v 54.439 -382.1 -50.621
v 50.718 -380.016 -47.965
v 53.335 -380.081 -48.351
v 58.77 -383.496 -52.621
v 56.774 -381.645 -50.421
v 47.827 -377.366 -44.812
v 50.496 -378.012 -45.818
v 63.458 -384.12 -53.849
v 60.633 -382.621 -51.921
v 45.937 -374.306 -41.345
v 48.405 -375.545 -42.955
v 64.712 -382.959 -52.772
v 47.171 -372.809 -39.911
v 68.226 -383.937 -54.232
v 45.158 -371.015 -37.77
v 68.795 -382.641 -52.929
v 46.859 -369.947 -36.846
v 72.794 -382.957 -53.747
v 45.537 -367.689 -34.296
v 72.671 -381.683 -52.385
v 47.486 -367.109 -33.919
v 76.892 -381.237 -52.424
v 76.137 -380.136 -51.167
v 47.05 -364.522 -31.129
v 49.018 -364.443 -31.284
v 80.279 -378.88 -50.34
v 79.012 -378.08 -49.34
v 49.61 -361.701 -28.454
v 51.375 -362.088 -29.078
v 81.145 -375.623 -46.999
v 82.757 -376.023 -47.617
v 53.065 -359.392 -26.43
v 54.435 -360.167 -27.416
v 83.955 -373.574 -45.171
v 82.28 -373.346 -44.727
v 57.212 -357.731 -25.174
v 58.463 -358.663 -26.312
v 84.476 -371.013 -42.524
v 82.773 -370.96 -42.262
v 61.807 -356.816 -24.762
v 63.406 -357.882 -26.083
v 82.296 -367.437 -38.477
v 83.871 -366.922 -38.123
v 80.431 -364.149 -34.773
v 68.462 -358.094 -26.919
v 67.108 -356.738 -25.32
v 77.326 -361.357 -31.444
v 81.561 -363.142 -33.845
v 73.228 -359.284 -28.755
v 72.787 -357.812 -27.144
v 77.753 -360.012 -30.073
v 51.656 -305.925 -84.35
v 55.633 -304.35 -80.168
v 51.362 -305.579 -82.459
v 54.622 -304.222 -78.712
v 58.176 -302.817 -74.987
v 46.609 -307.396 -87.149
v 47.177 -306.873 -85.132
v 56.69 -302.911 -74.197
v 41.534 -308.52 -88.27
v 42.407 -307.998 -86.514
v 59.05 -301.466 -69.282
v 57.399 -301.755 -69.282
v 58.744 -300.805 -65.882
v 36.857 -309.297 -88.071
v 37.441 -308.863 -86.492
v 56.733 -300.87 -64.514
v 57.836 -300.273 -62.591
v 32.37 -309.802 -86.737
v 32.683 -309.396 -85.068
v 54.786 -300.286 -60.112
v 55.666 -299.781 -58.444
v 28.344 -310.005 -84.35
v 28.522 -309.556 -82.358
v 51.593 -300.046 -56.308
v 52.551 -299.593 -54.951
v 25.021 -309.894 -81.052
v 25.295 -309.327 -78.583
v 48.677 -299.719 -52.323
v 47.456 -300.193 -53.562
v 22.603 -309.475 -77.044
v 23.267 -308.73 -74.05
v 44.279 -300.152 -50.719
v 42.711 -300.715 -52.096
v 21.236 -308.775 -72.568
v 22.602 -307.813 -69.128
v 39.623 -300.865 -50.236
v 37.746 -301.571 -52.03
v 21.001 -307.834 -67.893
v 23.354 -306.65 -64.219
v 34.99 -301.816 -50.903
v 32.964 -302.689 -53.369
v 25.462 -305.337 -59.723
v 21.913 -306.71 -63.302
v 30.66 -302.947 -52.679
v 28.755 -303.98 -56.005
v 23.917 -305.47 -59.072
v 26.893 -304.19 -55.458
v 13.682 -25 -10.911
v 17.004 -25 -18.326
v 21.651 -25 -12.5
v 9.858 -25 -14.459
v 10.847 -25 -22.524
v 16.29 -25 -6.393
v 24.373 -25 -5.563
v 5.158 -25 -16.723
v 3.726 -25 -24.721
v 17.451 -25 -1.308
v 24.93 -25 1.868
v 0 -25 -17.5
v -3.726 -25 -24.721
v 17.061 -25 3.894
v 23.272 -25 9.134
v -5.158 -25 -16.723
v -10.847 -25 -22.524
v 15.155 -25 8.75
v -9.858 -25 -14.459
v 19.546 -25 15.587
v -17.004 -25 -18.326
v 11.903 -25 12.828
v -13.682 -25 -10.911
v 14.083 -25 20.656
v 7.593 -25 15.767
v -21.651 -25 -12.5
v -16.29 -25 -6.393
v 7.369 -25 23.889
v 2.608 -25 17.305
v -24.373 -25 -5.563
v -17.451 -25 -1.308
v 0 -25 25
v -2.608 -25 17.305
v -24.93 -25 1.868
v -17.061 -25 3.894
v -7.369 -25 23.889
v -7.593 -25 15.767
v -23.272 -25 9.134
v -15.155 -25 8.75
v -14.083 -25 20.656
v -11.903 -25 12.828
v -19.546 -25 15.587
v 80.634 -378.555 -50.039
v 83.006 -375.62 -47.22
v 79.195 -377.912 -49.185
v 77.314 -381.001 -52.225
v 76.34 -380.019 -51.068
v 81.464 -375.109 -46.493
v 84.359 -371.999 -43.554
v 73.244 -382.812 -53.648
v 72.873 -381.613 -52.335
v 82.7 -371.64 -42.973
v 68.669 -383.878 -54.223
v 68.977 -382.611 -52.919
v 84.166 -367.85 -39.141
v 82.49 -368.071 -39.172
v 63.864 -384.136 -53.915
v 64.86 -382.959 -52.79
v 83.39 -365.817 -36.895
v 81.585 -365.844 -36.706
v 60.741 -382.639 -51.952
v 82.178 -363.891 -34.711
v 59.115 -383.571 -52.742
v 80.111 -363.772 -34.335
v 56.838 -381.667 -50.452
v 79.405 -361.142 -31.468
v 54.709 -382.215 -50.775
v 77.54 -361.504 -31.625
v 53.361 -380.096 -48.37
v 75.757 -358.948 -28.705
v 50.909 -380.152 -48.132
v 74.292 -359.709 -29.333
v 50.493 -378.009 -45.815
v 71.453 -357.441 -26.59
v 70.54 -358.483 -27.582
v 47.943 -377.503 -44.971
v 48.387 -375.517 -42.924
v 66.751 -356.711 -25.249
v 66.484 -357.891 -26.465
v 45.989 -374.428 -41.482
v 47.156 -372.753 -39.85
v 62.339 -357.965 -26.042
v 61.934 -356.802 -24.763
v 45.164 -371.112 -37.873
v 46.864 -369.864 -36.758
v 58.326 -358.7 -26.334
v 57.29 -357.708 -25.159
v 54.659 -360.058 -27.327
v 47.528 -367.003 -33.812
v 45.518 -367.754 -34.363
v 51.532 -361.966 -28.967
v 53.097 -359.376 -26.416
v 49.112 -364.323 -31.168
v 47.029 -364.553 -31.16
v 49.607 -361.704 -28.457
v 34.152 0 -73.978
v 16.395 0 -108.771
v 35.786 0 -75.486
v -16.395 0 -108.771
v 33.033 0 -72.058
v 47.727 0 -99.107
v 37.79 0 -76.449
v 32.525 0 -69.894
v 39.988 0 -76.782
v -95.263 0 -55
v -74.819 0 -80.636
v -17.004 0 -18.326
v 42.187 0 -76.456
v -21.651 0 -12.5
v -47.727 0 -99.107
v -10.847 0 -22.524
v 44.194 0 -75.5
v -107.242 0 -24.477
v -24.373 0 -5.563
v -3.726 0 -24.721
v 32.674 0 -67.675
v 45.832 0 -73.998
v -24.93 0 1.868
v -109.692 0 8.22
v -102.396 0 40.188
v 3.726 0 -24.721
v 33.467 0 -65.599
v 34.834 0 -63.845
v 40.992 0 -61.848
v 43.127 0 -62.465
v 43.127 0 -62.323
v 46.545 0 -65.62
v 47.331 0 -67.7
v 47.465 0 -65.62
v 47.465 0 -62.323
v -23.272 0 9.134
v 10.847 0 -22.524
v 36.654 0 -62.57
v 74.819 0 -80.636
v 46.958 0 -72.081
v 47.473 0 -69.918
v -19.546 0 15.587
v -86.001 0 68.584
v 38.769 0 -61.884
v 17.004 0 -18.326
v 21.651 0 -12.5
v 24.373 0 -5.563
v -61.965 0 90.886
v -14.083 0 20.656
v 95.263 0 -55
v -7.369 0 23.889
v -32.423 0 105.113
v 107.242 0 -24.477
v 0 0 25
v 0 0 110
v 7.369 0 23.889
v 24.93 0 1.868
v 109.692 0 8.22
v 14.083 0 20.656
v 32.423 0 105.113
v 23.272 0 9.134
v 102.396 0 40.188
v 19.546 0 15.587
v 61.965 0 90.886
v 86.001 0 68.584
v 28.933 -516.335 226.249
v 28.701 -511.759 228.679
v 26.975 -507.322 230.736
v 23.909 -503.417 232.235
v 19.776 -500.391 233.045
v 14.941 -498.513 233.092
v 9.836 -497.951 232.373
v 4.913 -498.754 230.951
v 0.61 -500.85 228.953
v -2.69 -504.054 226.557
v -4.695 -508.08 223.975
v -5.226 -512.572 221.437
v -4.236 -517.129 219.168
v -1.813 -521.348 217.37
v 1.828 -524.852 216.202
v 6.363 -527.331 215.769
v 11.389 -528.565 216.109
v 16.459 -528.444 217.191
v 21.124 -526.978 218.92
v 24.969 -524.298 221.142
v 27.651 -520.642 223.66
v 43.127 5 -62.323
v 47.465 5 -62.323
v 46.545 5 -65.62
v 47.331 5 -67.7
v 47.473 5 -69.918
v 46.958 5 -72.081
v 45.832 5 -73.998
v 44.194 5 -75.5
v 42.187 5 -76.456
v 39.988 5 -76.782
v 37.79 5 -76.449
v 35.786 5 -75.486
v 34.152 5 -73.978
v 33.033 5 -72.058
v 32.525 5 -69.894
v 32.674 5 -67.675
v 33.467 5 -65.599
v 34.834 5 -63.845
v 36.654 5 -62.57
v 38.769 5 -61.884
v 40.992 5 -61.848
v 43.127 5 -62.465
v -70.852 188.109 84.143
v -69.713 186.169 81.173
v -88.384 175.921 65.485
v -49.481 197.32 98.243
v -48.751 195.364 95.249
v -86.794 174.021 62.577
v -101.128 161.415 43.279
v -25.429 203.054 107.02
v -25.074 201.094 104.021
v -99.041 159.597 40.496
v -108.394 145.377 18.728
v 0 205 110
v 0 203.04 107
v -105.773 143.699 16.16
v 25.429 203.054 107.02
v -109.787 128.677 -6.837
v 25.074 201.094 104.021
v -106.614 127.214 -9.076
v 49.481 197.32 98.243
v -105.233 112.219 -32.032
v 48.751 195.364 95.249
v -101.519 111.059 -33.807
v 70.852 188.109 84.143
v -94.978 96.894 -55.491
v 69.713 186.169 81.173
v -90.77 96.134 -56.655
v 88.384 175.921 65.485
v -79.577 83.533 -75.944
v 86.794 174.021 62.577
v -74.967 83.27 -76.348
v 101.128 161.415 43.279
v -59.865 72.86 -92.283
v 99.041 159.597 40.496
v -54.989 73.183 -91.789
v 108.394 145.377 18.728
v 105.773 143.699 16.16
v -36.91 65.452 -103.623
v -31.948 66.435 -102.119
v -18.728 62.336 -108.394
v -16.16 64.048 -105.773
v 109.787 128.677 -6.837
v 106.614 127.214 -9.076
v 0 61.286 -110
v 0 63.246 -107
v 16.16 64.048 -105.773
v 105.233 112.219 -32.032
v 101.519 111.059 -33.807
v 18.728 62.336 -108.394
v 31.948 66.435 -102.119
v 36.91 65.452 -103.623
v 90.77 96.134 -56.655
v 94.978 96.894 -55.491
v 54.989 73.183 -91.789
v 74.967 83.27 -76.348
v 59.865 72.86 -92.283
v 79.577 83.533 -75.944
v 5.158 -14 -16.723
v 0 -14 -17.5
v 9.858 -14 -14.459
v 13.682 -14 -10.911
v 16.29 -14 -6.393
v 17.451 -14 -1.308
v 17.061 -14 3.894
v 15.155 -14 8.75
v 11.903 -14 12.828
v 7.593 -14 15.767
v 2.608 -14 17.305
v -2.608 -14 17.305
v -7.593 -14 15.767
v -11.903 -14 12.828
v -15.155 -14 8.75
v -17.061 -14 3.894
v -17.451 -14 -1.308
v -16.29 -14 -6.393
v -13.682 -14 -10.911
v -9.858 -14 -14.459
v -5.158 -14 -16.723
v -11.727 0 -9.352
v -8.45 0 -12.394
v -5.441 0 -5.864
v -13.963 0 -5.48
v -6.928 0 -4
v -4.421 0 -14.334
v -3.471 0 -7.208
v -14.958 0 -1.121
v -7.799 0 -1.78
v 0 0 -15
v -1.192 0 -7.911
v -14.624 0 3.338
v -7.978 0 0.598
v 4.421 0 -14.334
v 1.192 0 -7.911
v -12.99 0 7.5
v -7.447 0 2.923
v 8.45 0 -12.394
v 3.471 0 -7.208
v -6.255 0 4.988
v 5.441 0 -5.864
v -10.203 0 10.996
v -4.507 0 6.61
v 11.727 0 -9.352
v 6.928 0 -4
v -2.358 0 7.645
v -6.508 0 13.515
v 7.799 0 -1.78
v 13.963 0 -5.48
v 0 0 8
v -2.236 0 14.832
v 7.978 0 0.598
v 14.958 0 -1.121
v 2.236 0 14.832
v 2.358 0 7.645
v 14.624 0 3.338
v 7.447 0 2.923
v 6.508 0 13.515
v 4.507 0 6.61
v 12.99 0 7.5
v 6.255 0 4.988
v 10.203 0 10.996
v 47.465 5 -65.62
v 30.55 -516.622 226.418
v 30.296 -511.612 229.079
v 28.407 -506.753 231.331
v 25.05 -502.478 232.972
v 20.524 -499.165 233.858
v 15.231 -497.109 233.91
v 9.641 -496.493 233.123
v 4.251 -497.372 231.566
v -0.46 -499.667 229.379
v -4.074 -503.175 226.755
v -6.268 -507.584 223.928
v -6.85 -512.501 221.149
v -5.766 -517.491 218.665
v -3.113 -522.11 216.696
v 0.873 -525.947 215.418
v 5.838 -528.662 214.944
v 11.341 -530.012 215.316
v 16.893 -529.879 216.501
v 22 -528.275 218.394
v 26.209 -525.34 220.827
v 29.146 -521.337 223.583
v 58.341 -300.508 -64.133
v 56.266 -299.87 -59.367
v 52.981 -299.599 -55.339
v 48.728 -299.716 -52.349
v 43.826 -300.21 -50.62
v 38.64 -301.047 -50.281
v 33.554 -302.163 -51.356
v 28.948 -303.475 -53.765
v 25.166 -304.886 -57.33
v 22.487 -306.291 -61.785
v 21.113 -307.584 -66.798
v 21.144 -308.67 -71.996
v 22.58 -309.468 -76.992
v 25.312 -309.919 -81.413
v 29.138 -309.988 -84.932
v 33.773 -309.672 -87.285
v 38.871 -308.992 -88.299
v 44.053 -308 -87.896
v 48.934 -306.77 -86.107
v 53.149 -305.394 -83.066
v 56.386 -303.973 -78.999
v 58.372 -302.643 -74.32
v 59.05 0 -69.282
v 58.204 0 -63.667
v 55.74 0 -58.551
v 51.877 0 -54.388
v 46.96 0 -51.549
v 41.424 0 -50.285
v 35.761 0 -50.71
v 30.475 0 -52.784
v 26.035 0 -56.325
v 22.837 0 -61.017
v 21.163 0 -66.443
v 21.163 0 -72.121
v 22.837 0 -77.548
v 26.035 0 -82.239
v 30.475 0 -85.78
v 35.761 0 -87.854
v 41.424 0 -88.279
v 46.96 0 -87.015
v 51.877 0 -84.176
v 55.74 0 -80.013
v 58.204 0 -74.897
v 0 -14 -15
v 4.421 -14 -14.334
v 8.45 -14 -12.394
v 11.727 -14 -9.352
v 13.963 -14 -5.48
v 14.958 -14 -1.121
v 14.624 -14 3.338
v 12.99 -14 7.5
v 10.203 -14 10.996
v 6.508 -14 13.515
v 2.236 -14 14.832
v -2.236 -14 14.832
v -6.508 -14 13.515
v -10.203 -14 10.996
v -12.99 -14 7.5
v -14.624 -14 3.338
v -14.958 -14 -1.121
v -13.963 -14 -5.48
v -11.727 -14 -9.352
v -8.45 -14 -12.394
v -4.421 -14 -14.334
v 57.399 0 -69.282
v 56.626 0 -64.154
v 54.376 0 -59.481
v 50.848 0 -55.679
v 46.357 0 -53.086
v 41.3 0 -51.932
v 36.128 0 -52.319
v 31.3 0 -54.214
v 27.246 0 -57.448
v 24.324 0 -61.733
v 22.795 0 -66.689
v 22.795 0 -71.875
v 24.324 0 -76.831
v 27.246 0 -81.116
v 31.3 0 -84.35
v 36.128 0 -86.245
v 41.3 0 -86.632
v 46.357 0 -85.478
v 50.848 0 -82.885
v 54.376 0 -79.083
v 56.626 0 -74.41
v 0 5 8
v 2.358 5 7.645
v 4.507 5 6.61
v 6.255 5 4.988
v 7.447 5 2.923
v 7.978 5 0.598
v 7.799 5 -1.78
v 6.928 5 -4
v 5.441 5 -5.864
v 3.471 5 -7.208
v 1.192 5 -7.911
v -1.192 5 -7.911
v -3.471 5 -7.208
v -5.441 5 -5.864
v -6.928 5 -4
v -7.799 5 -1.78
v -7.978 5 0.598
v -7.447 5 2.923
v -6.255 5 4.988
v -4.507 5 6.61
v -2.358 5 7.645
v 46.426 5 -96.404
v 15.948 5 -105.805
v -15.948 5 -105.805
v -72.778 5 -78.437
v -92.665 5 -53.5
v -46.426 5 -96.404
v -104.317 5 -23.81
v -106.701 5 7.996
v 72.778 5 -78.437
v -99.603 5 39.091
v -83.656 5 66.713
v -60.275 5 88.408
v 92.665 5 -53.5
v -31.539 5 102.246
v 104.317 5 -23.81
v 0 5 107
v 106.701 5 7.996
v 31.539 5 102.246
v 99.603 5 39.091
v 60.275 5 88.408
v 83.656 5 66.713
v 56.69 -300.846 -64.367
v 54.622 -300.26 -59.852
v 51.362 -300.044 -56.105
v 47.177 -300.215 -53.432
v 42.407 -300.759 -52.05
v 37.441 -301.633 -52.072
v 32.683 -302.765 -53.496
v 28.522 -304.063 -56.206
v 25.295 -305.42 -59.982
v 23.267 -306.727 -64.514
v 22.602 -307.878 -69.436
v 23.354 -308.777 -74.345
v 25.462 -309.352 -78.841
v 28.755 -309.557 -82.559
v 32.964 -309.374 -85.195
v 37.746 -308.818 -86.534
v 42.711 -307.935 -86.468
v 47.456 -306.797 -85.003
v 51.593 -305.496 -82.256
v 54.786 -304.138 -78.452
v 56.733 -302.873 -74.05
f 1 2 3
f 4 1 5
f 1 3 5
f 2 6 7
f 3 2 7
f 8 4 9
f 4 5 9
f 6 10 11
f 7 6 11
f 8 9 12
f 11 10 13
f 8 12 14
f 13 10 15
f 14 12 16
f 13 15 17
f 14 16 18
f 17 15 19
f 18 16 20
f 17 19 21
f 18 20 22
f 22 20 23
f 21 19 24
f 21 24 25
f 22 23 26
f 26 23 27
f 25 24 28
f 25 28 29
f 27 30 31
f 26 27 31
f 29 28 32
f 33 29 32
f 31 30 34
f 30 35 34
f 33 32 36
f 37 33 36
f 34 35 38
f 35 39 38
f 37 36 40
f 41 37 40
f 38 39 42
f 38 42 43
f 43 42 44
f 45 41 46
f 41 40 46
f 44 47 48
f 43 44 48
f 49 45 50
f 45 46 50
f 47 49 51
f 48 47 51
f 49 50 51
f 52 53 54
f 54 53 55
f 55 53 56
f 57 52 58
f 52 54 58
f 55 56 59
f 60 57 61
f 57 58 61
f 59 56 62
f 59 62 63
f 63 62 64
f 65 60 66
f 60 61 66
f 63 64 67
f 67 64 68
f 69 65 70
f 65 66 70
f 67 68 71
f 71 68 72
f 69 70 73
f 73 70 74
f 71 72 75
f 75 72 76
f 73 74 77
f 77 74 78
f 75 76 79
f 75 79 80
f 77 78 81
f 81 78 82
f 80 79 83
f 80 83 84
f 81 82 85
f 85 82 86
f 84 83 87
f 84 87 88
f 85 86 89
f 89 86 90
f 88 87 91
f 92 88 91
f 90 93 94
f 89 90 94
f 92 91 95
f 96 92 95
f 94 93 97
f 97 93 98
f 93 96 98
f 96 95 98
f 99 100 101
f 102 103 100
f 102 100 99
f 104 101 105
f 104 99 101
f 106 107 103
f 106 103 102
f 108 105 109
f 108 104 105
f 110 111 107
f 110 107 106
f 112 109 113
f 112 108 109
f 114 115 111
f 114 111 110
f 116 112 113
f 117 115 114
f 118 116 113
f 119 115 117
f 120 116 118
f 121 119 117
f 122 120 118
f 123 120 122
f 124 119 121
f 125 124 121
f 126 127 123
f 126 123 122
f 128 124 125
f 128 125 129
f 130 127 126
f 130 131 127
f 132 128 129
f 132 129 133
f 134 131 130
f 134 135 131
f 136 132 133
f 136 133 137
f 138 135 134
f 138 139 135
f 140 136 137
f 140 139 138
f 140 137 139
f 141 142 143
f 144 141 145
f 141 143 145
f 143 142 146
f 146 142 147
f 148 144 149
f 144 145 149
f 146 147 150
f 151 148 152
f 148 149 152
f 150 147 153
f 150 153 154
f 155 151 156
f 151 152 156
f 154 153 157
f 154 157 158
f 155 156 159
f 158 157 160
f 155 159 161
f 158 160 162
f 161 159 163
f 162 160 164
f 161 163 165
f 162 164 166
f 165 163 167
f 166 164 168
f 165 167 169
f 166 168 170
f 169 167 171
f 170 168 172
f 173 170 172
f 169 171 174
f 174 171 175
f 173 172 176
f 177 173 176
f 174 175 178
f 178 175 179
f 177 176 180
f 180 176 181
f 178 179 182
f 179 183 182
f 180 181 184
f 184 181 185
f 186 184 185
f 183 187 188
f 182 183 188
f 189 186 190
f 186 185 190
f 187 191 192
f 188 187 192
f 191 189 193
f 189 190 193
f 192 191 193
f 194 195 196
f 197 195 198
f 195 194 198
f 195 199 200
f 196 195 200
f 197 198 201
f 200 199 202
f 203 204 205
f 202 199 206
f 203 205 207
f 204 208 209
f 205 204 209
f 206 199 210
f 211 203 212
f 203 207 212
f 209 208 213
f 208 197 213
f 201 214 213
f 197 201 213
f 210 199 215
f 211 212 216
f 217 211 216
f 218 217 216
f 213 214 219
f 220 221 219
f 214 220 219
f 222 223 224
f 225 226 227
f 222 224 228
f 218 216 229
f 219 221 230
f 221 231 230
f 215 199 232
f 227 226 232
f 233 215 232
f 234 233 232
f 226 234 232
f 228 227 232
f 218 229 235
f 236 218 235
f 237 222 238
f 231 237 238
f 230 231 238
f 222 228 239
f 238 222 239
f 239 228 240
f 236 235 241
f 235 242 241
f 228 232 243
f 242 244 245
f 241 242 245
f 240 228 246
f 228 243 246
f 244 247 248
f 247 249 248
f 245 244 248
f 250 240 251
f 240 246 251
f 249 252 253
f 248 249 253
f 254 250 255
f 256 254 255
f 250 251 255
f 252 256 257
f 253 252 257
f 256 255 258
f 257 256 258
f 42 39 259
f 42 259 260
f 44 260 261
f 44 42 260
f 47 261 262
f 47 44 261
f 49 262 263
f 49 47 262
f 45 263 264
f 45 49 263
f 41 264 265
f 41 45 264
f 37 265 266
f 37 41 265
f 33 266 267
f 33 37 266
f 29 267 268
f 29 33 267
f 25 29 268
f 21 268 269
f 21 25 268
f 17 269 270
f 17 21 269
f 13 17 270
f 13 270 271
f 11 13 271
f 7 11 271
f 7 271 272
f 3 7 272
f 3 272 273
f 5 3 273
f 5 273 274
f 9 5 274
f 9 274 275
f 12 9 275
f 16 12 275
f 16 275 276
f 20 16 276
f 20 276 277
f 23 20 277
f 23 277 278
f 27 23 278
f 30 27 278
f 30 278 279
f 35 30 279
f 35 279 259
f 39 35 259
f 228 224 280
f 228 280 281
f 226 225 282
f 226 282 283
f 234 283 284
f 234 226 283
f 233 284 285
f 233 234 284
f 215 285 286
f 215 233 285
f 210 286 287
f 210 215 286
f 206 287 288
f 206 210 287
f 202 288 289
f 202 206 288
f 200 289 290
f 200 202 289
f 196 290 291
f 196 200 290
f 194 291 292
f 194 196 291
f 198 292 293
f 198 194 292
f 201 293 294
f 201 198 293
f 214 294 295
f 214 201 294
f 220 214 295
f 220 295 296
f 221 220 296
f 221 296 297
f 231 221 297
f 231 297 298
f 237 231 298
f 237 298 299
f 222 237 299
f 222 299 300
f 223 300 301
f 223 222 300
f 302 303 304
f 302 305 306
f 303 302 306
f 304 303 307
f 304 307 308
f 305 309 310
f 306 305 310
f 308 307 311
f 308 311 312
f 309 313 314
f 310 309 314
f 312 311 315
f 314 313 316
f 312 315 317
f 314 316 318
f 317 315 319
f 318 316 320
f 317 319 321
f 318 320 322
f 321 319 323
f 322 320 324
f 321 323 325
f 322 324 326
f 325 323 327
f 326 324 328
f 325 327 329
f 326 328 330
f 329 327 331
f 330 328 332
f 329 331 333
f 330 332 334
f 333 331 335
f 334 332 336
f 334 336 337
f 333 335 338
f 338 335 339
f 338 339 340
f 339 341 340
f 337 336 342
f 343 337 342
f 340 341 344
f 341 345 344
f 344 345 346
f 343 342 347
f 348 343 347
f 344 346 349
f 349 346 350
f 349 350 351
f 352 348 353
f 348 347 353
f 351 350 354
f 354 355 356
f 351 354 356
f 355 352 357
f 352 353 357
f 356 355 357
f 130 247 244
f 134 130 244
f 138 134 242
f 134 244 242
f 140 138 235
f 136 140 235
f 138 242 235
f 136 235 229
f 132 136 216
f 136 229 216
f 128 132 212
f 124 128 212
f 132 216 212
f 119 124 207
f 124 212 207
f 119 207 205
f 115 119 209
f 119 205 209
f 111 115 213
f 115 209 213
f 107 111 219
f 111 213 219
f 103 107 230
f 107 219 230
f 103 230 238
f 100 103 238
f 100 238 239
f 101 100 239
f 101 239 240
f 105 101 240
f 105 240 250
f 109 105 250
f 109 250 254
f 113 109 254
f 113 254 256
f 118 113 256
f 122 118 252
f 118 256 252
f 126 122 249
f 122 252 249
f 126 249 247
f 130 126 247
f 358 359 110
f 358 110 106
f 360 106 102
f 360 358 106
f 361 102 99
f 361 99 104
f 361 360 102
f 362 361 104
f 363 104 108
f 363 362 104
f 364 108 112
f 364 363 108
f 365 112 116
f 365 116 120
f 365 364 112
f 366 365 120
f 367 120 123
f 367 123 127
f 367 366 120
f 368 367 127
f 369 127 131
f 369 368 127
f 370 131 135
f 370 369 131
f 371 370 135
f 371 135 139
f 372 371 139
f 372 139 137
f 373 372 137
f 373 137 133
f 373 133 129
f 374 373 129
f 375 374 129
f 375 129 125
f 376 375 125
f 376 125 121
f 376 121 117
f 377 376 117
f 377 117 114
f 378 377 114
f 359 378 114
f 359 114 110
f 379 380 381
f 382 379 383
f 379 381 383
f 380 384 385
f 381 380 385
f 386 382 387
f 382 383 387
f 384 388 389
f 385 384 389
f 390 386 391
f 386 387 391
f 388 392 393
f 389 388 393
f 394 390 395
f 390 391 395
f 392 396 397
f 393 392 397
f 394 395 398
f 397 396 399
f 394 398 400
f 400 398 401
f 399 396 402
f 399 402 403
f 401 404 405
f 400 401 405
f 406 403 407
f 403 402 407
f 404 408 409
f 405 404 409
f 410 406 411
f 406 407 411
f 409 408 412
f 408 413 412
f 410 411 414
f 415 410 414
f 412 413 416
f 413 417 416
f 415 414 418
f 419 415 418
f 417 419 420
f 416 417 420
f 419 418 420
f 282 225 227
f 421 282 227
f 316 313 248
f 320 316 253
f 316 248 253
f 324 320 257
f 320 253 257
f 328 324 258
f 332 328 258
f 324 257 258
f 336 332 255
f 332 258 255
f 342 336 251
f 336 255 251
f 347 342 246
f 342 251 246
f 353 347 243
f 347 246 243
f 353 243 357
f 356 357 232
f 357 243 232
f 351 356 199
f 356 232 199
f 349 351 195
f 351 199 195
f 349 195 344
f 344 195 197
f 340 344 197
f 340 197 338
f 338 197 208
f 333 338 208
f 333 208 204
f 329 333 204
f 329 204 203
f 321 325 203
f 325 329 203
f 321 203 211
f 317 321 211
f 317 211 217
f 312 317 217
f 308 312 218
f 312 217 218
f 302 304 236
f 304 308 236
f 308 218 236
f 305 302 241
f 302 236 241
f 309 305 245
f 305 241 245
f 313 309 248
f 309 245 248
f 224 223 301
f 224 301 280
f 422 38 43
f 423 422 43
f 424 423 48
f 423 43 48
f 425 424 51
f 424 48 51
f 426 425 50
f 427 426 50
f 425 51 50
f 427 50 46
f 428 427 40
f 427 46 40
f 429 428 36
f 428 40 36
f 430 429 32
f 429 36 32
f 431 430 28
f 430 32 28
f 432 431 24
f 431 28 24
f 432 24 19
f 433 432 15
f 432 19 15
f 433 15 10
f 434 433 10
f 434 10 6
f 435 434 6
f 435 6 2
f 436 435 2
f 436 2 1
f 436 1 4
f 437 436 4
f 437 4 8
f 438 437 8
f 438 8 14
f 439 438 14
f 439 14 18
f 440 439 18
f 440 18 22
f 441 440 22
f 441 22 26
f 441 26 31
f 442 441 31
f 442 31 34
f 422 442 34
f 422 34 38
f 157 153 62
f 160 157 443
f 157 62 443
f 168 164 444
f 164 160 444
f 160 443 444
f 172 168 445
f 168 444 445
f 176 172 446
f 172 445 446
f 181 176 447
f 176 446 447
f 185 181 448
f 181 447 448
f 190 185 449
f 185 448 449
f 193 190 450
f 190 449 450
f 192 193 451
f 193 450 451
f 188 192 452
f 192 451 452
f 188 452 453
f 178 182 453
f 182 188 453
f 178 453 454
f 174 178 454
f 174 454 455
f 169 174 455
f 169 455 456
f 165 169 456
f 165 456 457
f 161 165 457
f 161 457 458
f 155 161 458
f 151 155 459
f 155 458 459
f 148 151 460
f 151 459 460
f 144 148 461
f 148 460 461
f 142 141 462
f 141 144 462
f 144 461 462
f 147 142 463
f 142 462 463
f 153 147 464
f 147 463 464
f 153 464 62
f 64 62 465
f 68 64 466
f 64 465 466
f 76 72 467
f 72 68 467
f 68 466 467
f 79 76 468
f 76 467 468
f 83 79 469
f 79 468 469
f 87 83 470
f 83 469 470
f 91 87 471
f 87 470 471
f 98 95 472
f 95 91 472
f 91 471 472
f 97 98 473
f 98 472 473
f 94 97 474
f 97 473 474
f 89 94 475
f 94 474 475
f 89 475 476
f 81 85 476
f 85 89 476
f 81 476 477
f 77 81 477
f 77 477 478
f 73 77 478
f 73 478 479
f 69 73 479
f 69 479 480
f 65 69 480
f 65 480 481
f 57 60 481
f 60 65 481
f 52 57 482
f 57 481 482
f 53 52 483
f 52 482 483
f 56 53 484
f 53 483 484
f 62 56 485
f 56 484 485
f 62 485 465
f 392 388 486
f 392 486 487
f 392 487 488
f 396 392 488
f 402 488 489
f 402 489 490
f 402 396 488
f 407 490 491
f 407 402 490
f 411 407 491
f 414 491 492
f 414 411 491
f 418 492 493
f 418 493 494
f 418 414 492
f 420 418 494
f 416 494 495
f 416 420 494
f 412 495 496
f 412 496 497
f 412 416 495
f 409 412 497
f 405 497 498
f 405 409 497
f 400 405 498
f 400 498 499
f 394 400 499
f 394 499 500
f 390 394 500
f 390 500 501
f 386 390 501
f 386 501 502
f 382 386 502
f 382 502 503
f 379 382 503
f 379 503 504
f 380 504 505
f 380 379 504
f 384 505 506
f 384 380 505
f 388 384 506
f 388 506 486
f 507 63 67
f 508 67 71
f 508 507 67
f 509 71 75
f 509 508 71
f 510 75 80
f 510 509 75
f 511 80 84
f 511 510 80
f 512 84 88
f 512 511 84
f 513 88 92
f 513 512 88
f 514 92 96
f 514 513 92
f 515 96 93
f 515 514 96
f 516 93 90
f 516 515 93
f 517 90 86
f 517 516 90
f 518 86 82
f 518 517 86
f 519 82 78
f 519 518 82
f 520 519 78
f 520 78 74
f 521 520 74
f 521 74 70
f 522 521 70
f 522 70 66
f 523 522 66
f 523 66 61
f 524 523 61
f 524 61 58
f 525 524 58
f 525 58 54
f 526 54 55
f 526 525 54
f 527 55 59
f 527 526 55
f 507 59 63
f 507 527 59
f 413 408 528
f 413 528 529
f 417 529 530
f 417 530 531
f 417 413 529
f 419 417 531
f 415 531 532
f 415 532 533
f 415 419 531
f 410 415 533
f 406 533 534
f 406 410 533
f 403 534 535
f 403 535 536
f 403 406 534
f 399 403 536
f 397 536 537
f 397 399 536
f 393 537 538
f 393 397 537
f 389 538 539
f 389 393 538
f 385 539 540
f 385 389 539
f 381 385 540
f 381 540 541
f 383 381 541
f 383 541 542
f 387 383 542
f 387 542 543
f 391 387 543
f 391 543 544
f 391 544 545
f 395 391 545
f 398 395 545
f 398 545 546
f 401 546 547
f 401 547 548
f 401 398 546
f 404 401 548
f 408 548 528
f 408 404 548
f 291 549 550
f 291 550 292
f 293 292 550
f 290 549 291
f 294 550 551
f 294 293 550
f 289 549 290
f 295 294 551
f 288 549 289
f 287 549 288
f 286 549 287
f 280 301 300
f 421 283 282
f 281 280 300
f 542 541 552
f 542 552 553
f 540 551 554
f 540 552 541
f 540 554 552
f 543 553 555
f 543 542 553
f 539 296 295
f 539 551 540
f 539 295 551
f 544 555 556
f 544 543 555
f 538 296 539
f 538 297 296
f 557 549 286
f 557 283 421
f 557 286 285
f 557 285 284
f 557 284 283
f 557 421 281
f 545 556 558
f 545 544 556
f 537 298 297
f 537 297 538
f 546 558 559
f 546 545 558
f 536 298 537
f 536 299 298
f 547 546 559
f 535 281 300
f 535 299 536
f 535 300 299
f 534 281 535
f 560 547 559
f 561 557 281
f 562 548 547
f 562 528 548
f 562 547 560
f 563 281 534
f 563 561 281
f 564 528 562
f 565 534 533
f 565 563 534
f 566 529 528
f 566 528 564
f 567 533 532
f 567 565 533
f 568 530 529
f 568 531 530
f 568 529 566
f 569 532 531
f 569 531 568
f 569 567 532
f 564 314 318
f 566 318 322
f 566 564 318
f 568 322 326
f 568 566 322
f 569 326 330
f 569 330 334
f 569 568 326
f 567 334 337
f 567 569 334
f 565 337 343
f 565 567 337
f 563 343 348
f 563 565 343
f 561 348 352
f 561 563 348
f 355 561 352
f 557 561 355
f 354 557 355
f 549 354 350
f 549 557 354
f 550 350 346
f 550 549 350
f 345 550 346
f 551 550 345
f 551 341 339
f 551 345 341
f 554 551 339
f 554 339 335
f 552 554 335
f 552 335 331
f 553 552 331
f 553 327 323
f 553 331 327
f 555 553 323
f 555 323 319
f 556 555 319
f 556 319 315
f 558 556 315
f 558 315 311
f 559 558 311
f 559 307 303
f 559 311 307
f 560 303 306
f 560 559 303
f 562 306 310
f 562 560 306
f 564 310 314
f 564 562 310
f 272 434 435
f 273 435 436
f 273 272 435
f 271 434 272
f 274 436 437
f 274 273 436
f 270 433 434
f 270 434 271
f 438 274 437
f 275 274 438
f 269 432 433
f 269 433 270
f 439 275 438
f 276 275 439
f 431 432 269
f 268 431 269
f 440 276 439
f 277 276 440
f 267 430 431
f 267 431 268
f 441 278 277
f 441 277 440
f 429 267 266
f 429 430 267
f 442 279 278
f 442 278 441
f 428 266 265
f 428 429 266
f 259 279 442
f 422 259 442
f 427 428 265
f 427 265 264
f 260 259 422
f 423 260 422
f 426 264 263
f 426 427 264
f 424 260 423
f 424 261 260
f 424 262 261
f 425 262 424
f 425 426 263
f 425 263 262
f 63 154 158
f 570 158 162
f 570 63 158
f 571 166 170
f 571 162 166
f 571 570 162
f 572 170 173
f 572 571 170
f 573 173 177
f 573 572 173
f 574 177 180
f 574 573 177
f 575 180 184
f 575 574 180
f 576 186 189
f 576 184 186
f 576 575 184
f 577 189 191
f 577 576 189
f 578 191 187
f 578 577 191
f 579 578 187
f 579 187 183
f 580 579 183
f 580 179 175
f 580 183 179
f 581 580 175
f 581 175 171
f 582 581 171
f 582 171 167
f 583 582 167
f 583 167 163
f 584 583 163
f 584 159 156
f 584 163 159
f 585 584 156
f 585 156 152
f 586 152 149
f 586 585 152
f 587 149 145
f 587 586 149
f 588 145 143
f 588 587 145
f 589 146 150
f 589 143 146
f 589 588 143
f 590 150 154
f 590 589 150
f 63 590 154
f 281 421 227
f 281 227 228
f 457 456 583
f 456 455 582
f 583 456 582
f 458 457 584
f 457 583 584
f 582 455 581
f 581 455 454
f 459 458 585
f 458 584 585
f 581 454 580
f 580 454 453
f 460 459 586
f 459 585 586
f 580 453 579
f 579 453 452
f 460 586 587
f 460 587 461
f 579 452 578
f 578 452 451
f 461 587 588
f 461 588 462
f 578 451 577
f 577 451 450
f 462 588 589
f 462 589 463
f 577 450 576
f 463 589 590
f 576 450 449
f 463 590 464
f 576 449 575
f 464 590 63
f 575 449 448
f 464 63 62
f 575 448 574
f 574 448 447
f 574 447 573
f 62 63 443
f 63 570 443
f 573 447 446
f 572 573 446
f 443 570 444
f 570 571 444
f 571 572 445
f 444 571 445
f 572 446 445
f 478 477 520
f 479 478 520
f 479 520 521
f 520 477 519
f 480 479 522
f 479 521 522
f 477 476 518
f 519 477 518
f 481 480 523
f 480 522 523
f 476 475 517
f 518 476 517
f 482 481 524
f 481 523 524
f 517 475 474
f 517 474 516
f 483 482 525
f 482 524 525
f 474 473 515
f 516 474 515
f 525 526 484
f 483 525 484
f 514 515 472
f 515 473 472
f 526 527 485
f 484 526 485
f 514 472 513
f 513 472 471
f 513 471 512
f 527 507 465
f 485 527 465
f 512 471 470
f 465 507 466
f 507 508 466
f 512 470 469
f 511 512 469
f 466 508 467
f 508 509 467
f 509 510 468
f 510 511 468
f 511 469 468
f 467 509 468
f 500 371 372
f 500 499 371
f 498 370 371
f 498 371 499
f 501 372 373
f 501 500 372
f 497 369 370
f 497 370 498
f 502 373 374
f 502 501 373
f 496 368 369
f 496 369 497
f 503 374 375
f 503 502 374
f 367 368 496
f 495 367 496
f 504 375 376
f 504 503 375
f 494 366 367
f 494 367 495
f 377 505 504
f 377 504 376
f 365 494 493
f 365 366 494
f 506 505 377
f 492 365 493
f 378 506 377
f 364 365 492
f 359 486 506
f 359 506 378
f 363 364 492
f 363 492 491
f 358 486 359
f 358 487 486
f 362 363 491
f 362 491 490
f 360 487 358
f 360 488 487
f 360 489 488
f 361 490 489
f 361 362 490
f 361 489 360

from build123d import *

# Parameters (mm, degrees)
SKETCH6_R                                      = 110
SKETCH6_R_2                                    = 8
SKETCH6_R_3                                    = 7.5
BOSS_EXTRUDE5_DEPTH                            = 5
SKETCH8_R                                      = 110
SKETCH8_R_2                                    = 107
BOSS_EXTRUDE6_DEPTH                            = 200
CUT_EXTRUDE1_DEPTH                             = 258.342184649
CUT_EXTRUDE1_DEPTH_BACK                        = 258.342184649
SKETCH11_R                                     = 25
SKETCH11_R_2                                   = 17.5
BOSS_EXTRUDE7_DEPTH                            = 25
SKETCH12_R                                     = 17.5
SKETCH12_R_2                                   = 15
BOSS_EXTRUDE8_DEPTH                            = 14
SKETCH13_W                                     = 4.337683853
SKETCH13_H                                     = 3.296654895
CUT_EXTRUDE2_DEPTH                             = 10
SKETCH1_R                                      = 19.05
SKETCH1_R_2                                    = 17.399
AL_ROUND_TUBING_AL_RND_TUBE_1_5_OD_X_0_0_DEPTH = 313.166024089
SKETCH1_ON_SEGMENT_2_R                         = 19.05
SKETCH1_ON_SEGMENT_2_R_2                       = 17.399
AL_ROUND_TUBING_AL_RND_TUBE_1_5_OD_X_3_DEPTH   = 97.201236225
SKETCH1_ON_SEGMENT_3_R                         = 19.05
SKETCH1_ON_SEGMENT_3_R_2                       = 17.399
AL_ROUND_TUBING_AL_RND_TUBE_1_5_OD_X_5_DEPTH   = 317.435212136


with BuildPart() as part:
    # Sketch6 → Boss-Extrude5 (new body)
    with BuildSketch(Plane(origin=(0, 0, 0), x_dir=(1, 0, 0), z_dir=(0, 1, 0))):
        with Locations(Location((0, 0, 0), (0, 0, 270))):
            Circle(SKETCH6_R)
        with Locations(Location((0, 0, 0), (0, 0, 270))):
            Circle(SKETCH6_R_2, mode=Mode.SUBTRACT)
        with Locations(Location((40, 69.282032303, 0), (0, 0, 270))):
            Circle(SKETCH6_R_3, mode=Mode.SUBTRACT)
    extrude(amount=BOSS_EXTRUDE5_DEPTH)

    # Sketch8 → Boss-Extrude6 (add)
    with BuildSketch(Plane(origin=(0, 5, 0), x_dir=(1, 0, 0), z_dir=(0, 1, 0))):
        with Locations(Location((0, 0, 0), (0, 0, 270))):
            Circle(SKETCH8_R)
        with Locations(Location((0, 0, 0), (0, 0, 270))):
            Circle(SKETCH8_R_2, mode=Mode.SUBTRACT)
    extrude(amount=BOSS_EXTRUDE6_DEPTH)

    # Sketch10 → Cut-Extrude1 (cut, two sides)
    with BuildSketch(Plane(origin=(0, 0, 0), x_dir=(0, 0, -1), z_dir=(1, 0, 0))) as cut_extrude1_sk:
        Polygon((-110, 205), (110, 61.286460946), (110, 205), align=None)
    extrude(amount=CUT_EXTRUDE1_DEPTH, mode=Mode.SUBTRACT)
    extrude(cut_extrude1_sk.sketch, amount=-CUT_EXTRUDE1_DEPTH_BACK, mode=Mode.SUBTRACT)

    # Sketch11 → Boss-Extrude7 (add)
    with BuildSketch(Plane.XZ):
        with Locations(Location((0, 0, 0), (0, 0, 90))):
            Circle(SKETCH11_R)
        with Locations(Location((0, 0, 0), (0, 0, 270))):
            Circle(SKETCH11_R_2, mode=Mode.SUBTRACT)
    extrude(amount=BOSS_EXTRUDE7_DEPTH)

    # Sketch12 → Boss-Extrude8 (add)
    with BuildSketch(Plane.XZ):
        with Locations(Location((0, 0, 0), (0, 0, 270))):
            Circle(SKETCH12_R)
        with Locations(Location((0, 0, 0), (0, 0, 270))):
            Circle(SKETCH12_R_2, mode=Mode.SUBTRACT)
    extrude(amount=BOSS_EXTRUDE8_DEPTH)

    # Sketch13 → Cut-Extrude2 (cut)
    with BuildSketch(Plane.XZ):
        with Locations((45.296232559, -63.971672552)):
            Rectangle(SKETCH13_W, SKETCH13_H)
    extrude(amount=-CUT_EXTRUDE2_DEPTH, mode=Mode.SUBTRACT)


with BuildPart() as body_2:
    # Sketch1 → Al round tubing AL RND TUBE 1.5 OD X 0.063 WALL(7) (new body)
    with BuildSketch(Plane(origin=(40, 0, -69.282032303), x_dir=(1, 0, 0), z_dir=(0, -1, 0))):
        Circle(SKETCH1_R)
        Circle(SKETCH1_R_2, mode=Mode.SUBTRACT)
    extrude(amount=AL_ROUND_TUBING_AL_RND_TUBE_1_5_OD_X_0_0_DEPTH)

    # Al round tubing AL RND TUBE 1.5 OD X 2
    split(bisect_by=Plane(origin=(40, -304.8, -69.282032303), x_dir=(-0.985025258, -0.172410096, 0), z_dir=(-0.168834183, 0.964595101, -0.202611229)), keep=Keep.TOP)


with BuildPart() as body_3:
    # Sketch1 on segment 2 (carried to segment 2) → Al round tubing AL RND TUBE 1.5 OD X 3 (new body)
    with BuildSketch(Plane(origin=(37.275075097, -297.597795128, -72.552106968), x_dir=(0.942990038, 0.325713251, -0.068415402), z_dir=(0.325713251, -0.860887417, 0.390875598))):
        Circle(SKETCH1_ON_SEGMENT_2_R)
        Circle(SKETCH1_ON_SEGMENT_2_R_2, mode=Mode.SUBTRACT)
    extrude(amount=AL_ROUND_TUBING_AL_RND_TUBE_1_5_OD_X_3_DEPTH)

    # Al round tubing AL RND TUBE 1.5 OD X 3 m
    split(bisect_by=Plane(origin=(40, -304.8, -69.282032303), x_dir=(0.985025258, 0.172410096, 0), z_dir=(0.168834183, -0.964595101, 0.202611229)), keep=Keep.TOP)

    # Al round tubing AL RND TUBE 1.5 OD X 4
    split(bisect_by=Plane(origin=(64.819349716, -370.399621206, -39.497311768), x_dir=(-0.993524923, -0.113614379, 0), z_dir=(-0.082820389, 0.724240375, -0.684555814)), keep=Keep.TOP)


with BuildPart() as body_4:
    # Sketch1 on segment 3 (carried to segment 3) → Al round tubing AL RND TUBE 1.5 OD X 5 (new body)
    with BuildSketch(Plane(origin=(67.013431278, -364.475251828, -50.43972646), x_dir=(0.979471613, -0.173648178, 0.102380022), z_dir=(-0.173648178, -0.468877714, 0.866025404))):
        Circle(SKETCH1_ON_SEGMENT_3_R)
        Circle(SKETCH1_ON_SEGMENT_3_R_2, mode=Mode.SUBTRACT)
    extrude(amount=AL_ROUND_TUBING_AL_RND_TUBE_1_5_OD_X_5_DEPTH)

    # Al round tubing AL RND TUBE 1.5 OD X 5 m
    split(bisect_by=Plane(origin=(64.819349716, -370.399621206, -39.497311768), x_dir=(0.993524923, 0.113614379, 0), z_dir=(0.082820389, -0.724240375, 0.684555814)), keep=Keep.TOP)


solid = Compound([part.part, body_2.part, body_3.part, body_4.part])
